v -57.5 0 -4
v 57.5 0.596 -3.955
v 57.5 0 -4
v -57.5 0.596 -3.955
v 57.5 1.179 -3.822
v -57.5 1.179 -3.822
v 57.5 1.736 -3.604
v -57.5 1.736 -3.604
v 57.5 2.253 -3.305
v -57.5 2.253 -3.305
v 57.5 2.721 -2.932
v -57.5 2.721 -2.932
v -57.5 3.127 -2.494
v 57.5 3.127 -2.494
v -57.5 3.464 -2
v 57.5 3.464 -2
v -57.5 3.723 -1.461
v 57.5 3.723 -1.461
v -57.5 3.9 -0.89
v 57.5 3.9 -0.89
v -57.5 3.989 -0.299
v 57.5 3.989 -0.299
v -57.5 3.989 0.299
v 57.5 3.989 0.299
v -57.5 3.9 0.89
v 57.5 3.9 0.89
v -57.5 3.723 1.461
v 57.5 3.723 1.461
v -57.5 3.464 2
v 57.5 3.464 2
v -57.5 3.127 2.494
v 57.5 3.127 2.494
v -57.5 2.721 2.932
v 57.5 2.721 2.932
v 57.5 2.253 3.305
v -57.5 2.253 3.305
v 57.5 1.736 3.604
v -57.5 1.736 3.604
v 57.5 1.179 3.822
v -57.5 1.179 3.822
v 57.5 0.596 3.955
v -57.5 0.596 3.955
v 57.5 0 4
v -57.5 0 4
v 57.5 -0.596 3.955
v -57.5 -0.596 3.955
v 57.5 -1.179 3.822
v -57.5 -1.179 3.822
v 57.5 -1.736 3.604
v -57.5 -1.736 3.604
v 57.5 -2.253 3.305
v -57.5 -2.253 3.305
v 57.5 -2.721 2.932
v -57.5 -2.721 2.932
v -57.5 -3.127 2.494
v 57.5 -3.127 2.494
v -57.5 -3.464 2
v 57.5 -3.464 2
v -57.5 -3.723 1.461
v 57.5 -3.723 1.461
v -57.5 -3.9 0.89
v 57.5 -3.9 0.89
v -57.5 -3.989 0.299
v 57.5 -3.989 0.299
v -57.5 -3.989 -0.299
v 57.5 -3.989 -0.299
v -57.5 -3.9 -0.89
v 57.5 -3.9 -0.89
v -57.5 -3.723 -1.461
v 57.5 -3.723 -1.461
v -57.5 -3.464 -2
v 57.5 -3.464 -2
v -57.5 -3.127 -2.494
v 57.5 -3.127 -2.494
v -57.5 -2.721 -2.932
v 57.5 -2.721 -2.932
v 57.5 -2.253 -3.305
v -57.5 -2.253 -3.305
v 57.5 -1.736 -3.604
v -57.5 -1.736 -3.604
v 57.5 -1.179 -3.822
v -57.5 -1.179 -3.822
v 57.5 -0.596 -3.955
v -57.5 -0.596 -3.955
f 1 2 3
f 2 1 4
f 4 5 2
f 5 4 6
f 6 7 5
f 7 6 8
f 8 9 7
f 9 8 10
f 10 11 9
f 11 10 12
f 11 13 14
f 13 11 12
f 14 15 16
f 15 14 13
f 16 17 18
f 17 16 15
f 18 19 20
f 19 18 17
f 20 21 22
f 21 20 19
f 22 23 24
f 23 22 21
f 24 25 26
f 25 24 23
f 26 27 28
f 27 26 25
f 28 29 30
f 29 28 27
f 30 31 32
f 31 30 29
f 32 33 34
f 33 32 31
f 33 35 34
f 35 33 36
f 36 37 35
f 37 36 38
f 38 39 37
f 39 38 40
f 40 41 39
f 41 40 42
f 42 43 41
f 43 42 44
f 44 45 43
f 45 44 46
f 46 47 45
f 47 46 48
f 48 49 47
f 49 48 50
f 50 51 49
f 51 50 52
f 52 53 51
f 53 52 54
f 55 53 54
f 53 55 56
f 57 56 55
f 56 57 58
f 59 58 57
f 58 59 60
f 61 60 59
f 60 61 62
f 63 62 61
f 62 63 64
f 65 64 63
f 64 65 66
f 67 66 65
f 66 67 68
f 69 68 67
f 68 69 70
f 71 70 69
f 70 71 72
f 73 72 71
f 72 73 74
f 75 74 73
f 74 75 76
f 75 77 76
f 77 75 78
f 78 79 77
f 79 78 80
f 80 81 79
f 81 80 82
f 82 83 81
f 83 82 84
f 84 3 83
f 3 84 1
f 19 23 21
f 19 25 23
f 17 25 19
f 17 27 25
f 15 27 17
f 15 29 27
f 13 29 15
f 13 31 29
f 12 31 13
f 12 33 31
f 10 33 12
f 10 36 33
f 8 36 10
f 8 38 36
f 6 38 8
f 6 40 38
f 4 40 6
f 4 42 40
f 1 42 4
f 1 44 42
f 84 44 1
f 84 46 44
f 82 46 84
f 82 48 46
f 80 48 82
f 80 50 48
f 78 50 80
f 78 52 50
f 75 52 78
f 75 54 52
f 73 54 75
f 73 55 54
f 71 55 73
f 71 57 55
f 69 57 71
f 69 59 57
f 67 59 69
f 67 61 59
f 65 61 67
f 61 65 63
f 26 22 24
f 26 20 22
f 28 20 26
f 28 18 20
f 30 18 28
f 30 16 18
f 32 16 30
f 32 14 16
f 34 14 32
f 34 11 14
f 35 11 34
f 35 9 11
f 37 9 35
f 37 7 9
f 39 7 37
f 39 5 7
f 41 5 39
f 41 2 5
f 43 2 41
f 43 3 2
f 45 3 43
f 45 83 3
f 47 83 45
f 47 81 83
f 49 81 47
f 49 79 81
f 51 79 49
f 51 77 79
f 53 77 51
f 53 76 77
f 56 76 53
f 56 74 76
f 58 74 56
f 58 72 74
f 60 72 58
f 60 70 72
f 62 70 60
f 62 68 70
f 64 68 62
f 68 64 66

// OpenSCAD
// file: params.scad
// ============================================================
//  Scanner 3D LiDAR — paramètres partagés
//  Toutes les cotes sont en millimètres.
//
//  Repère d'assemblage : z = 0 sur la face SUPÉRIEURE du plateau
//  de base. L'axe de rotation (lacet psi) est l'axe Z.
// ============================================================

// Finesse de facettisation adaptative : les petits perçages restent
// légers, les grands diamètres restent lisses.
$fa = 4;
$fs = 0.6;

// ------------------------------------------------------------
//  Ajustements d'impression
//  À recalibrer sur votre imprimante avec mechanical/openscad/
//  test_fits.scad avant d'imprimer les pièces définitives.
// ------------------------------------------------------------
fit_press = 0.15;   // serré   : roulement — encoche 5 du coupon (delta +0,15 → Ø22,15)
fit_slide = 0.45;   // glissant: tige — encoche 4 (delta +0,10 → Ø8,45)
fit_free = 0.50;    // libre   : dégagements

// ------------------------------------------------------------
//  Roulement 608ZZ
// ------------------------------------------------------------
bearing_od = 22;
bearing_id = 8;
bearing_w = 7;

// ------------------------------------------------------------
//  Arbre vertical (tige acier rectifiée Ø8 h6)
// ------------------------------------------------------------
shaft_d = 8;
// Longueur utile : de l'accouplement (z 65) au sommet du moyeu (z 180).
// Ne PAS dépasser 180 : au-delà, la tige pénètre dans le corps du LD19.
shaft_len = 115;

// ------------------------------------------------------------
//  Moteur NEMA 17 (17HS4401)
// ------------------------------------------------------------
nema_body = 42.3;
nema_len = 40;       // longueur du corps (marge : 38 mm réels)
nema_pitch = 31;     // entraxe carré des 4 vis M3
nema_boss_d = 22;    // bossage de centrage
nema_boss_h = 2;
nema_shaft_d = 5;
nema_shaft_l = 24;

// ------------------------------------------------------------
//  Accouplement flexible 5 mm -> 8 mm (type mâchoires / araignée)
// ------------------------------------------------------------
coupler_d = 19;
coupler_l = 25;

// ------------------------------------------------------------
//  LiDAR — STL-19P / FHL-LD19P (LDROBOT, 3 oreilles de fixation)
//  Câble vers le bas au montage sur le berceau.
//  ATTENTION : lidar_optical_offset à VÉRIFIER au pied à coulisse.
//  Voir docs/calibration.md § « Mesure du décalage optique ».
//  Perçage : datasheet STL-19P § 5.1 (cotes depuis le bord « back » = bas
//  au montage, câble en bas). Entraxe latéral 46,8 mm ; connecteur à 38,59 mm.
// ------------------------------------------------------------
lidar_w = 54;                  // envergure Y (oreilles comprises)
lidar_h = 46.29;               // hauteur Z sur la platine (face de fixation)
lidar_thk = 34.8;              // profondeur X (datasheet 34,80 mm)
lidar_optical_offset = 22;     // plan de balayage / face de fixation  <-- À VÉRIFIER
lidar_screw_d = 2.7;           // M2,5 traversant (3× Φ2,5)
lidar_hole_y = 23.4;           // demi-entraxe Y oreilles latérales (46,8 / 2)
lidar_side_hole_z = 31.92;     // Z oreilles lat. depuis le bas du footprint
lidar_top_hole_z = 42.69;      // Z oreille opposée au câble (46,29 − 3,6)
lidar_cable_z = 38.59;         // connecteur ZH1.5T (face câble) depuis le bas
lidar_cable_d = 14;            // passage nappe + connecteur (était 9 mm, trop juste)

// ------------------------------------------------------------
//  Visserie M3
// ------------------------------------------------------------
m3_clear = 3.4;
m3_head_d = 6.2;
m3_head_h = 3.2;
m3_nut_af = 5.6;   // entreplat
m3_nut_h = 2.7;

// ------------------------------------------------------------
//  Insert laiton 1/4"-20 UNC (fixation trépied)
// ------------------------------------------------------------
insert_qtr_d = 8.4;
insert_qtr_l = 13;

// ------------------------------------------------------------
//  Plateau de base
// ------------------------------------------------------------
plate_d = 126;
plate_t = 8;
tripod_boss_d = 30;
tripod_boss_h = 16;
tower_bolt_circle = 106;   // hors du cône : têtes de vis accessibles

// ------------------------------------------------------------
//  Colonne à roulements  (z local = 0 sur la face inférieure,
//  qui repose sur la face supérieure du plateau)
// ------------------------------------------------------------
tower_flange_d = 118;
tower_flange_t = 6;
tower_base_d = 96;
tower_top_d = 34;
tower_cone_top_z = 100;   // fin du cône
tower_total_h = 133;      // hauteur totale
tower_cavity_d = 62;      // dégagement moteur (diagonale NEMA 17 = 59.8 mm)
tower_cavity_top_z = 42;
tower_throat_d = 26;      // dégagement accouplement (Ø19)
tower_throat_z = 78;

bearing_lo_z = 82;        // face inférieure du roulement bas
bearing_hi_z = 122;       // face inférieure du roulement haut
bearing_relief_d = 23.5;

// ------------------------------------------------------------
//  Berceau LiDAR  (cotes en repère d'assemblage global)
// ------------------------------------------------------------
hub_d = 18;
hub_z0 = 140;
hub_z1 = 180;
hub_top_d = 12;          // rétreint pour limiter l'occultation au nadir
web_z0 = 176;
web_z1 = 188;
web_hw = 7;              // demi-largeur en Y
plate_x = -22;           // face de fixation du LiDAR (= -lidar_optical_offset)
cradle_plate_t = 5;
optical_z = 205;         // hauteur du centre optique  => centre du nuage

// ------------------------------------------------------------
//  Boîtier électronique
// ------------------------------------------------------------
box_ix = 106;
box_iy = 76;
box_iz = 34;
box_wall = 2.5;
// file: electronics_box.scad
// ============================================================
//  04 — Boîtier électronique  (ESP32-S3, TMC2209, buck, trigger PD)
//
//  Se sangle par colliers rilsan sur la colonne centrale du trépied
//  (berceaux en Ø32 sous le fond). L'électronique reste ainsi au sol :
//  la tête rotative demeure légère et le trépied équilibré.
//
//  Impression : ouverture vers le haut, sans support.
// ============================================================

include <lib.scad>

box_ox = box_ix + 2 * box_wall;
box_oy = box_iy + 2 * box_wall;
box_floor = 3;

// Colonnettes d'angle : volontairement fusionnées aux deux parois
// adjacentes, une colonnette isolée de Ø8 sur 34 mm casserait net.
post_x = box_ix / 2 - 4;
post_y = box_iy / 2 - 4;

module post(x, y) {
    translate([x, y, box_floor]) cylinder(d = 9, h = box_iz);
}

module electronics_box() {
    difference() {
        union() {
            // ---------- Coque ----------
            translate([-box_ox / 2, -box_oy / 2, 0])
                cube([box_ox, box_oy, box_iz + box_floor]);

            // ---------- Berceau de sanglage sur colonne de trépied ----------
            // Le boîtier reste au sol, sur la colonne centrale : la tête
            // rotative demeure légère et le trépied équilibré.
            for (x = [-34, 34])
                translate([x, 0, -6]) {
                    difference() {
                        translate([-7, -box_oy / 2, 0]) cube([14, box_oy, 6.01]);
                        translate([0, 0, -14]) rotate([90, 0, 0])
                            cylinder(d = 32, h = box_oy + 2, center = true);
                    }
                }
        }

        // ---------- Volume intérieur ----------
        translate([-box_ix / 2, -box_iy / 2, box_floor])
            cube([box_ix, box_iy, box_iz + 1]);

        // ---------- Presse-étoupe / passages de câbles ----------
        // câble LiDAR + moteur (côté colonne)
        for (y = [-22, 0, 22])
            translate([-box_ox / 2 - 1, y, box_floor + 14])
                rotate([0, 90, 0]) cylinder(d = 8, h = box_wall + 2);
        // entrée USB-C PD
        translate([box_ox / 2 - 1, 0, box_floor + 10])
            rotate([0, 90, 0]) cylinder(d = 12, h = box_wall + 2);
        // sortie USB-C de programmation ESP32
        translate([box_ox / 2 - 1, 30, box_floor + 10])
            rotate([0, 90, 0]) cylinder(d = 12, h = box_wall + 2);

        // ---------- Ventilation ----------
        for (x = [-3:3], y = [-1, 1])
            translate([x * 12, y * 26, -0.1]) cylinder(d = 5, h = box_floor + 0.2);

        // ---------- Passages rilsan (sanglage trépied) ----------
        for (x = [-34, 34], y = [-1, 1])
            translate([x, y * (box_oy / 2 - 1), box_floor + 6])
                rotate([90, 0, 0]) cube([5, 3, box_wall + 3], center = true);

    }

    // ---------- Colonnettes de couvercle ----------
    for (x = [-1, 1], y = [-1, 1])
        difference() {
            post(x * post_x, y * post_y);
            // avant-trou taraudé par la vis M3
            translate([x * post_x, y * post_y, box_iz + box_floor - 9])
                cylinder(d = 2.6, h = 10);
        }

    // ---------- Rails de montage des modules ----------
    // Grille de bossages M3 : fixation par vis autotaraudeuses ou rilsan.
    for (x = [-40, -14, 14, 40], y = [-20, 20])
        difference() {
            translate([x, y, box_floor]) cylinder(d = 7, h = 4);
            translate([x, y, box_floor + 0.5]) cylinder(d = 2.6, h = 5);
        }
}

electronics_box();
// file: lidar_cradle.scad
// ============================================================
//  03 — Berceau LiDAR
//  Serre sur la tige Ø8 et présente le STL-19P (LDROBOT) COUCHÉ SUR LA
//  TRANCHE, plan de balayage vertical contenant l'axe de rotation.
//  Fixation : 3 oreilles M2,5 (datasheet § 5.1), câble vers le bas.
//
//  Repère local : z = 0 à la base du moyeu (= z 140 en global).
//  Centre optique du LD19 en (0, 0, 65) local.
//
//  Contrainte de non-collision : tout ce qui se trouve en
//  x > plate_x doit rester sous z = 42.7 (dessous du LD19).
//
//  Impression : COUCHÉ, platine à plat sur le plateau
//  (rotate([0, -90, 0])). Supports sous le moyeu uniquement.
// ============================================================

include <lib.scad>

hub_h = hub_z1 - hub_z0;               // 40
optical_local_z = optical_z - hub_z0;  // 65
lidar_bottom = optical_local_z - lidar_h / 2;   // 45.7
clear_z = lidar_bottom - 3;                     // 42.7 : plafond du voile

web_lo = 24;
web_hi = 40;
plate_lo = 32;
plate_hi = 92;
plate_hw = 29;      // demi-largeur platine (58 mm > envergure 54 mm)
plate_back = plate_x - cradle_plate_t;   // -27

// Perçage M2,5 traversant la platine (axe X)
module lidar_mount_hole() {
    translate([plate_back - 0.1, 0, 0])
        rotate([0, 90, 0]) cylinder(d = lidar_screw_d, h = cradle_plate_t + 3);
}

module lidar_cradle() {
    difference() {
        union() {
            // ---------- Moyeu de serrage sur la tige ----------
            cylinder(d = hub_d, h = hub_h - 10);
            translate([0, 0, hub_h - 10])
                cylinder(d1 = hub_d, d2 = hub_top_d, h = 10);

            // ---------- Oreilles de serrage ----------
            translate([5, -9, 4]) cube([14, 18, 15]);

            // ---------- Secteur de butée (référence d'azimut) ----------
            rotate([0, 0, 180])
                difference() {
                    cylinder(d = 48, h = 10);
                    translate([0, 0, -1]) cylinder(d = hub_d - 0.01, h = 12);
                    rotate([0, 0, 13]) translate([-40, 0, -1]) cube([80, 80, 12]);
                    rotate([0, 0, -13]) translate([-40, -80, -1]) cube([80, 80, 12]);
                }

            // ---------- Voile de liaison moyeu <-> platine ----------
            hull() {
                translate([-2, -web_hw, web_lo]) cube([4, 2 * web_hw, web_hi - web_lo]);
                translate([plate_back, -web_hw, web_lo])
                    cube([4, 2 * web_hw, web_hi - web_lo]);
            }
            // nervure centrale du voile
            translate([plate_back, -3.5, web_lo - 6])
                cube([abs(plate_back), 7, clear_z - web_lo + 6]);

            // ---------- Platine de fixation du LiDAR ----------
            translate([plate_back, -plate_hw, plate_lo])
                cube([cradle_plate_t, 2 * plate_hw, plate_hi - plate_lo]);

            // ---------- Rebord de centrage STL-19P (côté +X) ----------
            difference() {
                translate([plate_x, -(lidar_w / 2 + 2.5), lidar_bottom - 2.5])
                    cube([2.5, lidar_w + 5, lidar_h + 5]);
                translate([plate_x - 0.1, -lidar_w / 2 - 0.25, lidar_bottom - 0.25])
                    cube([3, lidar_w + 0.5, lidar_h + 0.5]);
            }

            // ---------- Nervures dorsales (côté -X, hors volume LiDAR) ----------
            for (s = [-1, 1])
                translate([plate_back, s * (plate_hw - 5) - 2.5, plate_lo])
                    hull() {
                        cube([0.1, 5, plate_hi - plate_lo]);
                        translate([-13, 0, 0]) cube([0.1, 5, 26]);
                    }
        }

        // ---------- Alésage de la tige ----------
        translate([0, 0, -0.1]) cylinder(d = shaft_d + fit_slide, h = hub_h + 0.2);

        // ---------- Fente du collier ----------
        translate([3, -0.9, -0.1]) cube([22, 1.8, hub_h + 0.2]);

        // ---------- Vis de serrage M3 (axe Y) ----------
        translate([12, 12, 11.5]) rotate([90, 0, 0]) cylinder(d = m3_clear, h = 24);
        translate([12, -9.01, 11.5]) rotate([-90, 0, 0])
            cylinder(d = m3_nut_af / cos(30), h = 3.2, $fn = 6);

        // ---------- Fixation STL-19P : 3 oreilles M2,5 (câble vers le bas) ----------
        translate([0, -lidar_hole_y, lidar_bottom + lidar_side_hole_z])
            lidar_mount_hole();
        translate([0, lidar_hole_y, lidar_bottom + lidar_side_hole_z])
            lidar_mount_hole();
        translate([0, 0, lidar_bottom + lidar_top_hole_z])
            lidar_mount_hole();

        // ---------- Passage nappe / connecteur ZH1.5T (côté câble) ----------
        translate([plate_back - 0.1, 0, lidar_bottom + lidar_cable_z])
            rotate([0, 90, 0]) cylinder(d = lidar_cable_d, h = cradle_plate_t + 3);
        // dégagement dans le rebord de centrage
        translate([plate_x - 0.5, -lidar_cable_d / 2 - 1, lidar_bottom + lidar_cable_z - lidar_cable_d / 2])
            cube([4, lidar_cable_d + 2, lidar_cable_d + 2]);

        // ---------- Colliers rilsan de sécurité ----------
        for (z = [plate_lo + 8, plate_hi - 9])
            for (y = [-1, 1])
                translate([plate_back - 0.1, y * (plate_hw - 5), z])
                    rotate([0, 90, 0])
                        cube([5, 2.8, cradle_plate_t + 3], center = true);
    }
}

lidar_cradle();
// file: bearing_tower.scad
// ============================================================
//  02 — Colonne à roulements
//  Coiffe le moteur, porte les deux 608ZZ qui définissent l'axe
//  de rotation. C'est la pièce qui détermine la précision angulaire.
//
//  Impression : bride sur le plateau, telle quelle. Pas de support.
//  Réglages conseillés : 5 périmètres, 40 % remplissage.
// ============================================================

include <lib.scad>

module bearing_tower() {
    difference() {
        // ---------- Volume extérieur ----------
        union() {
            cylinder(d = tower_flange_d, h = tower_flange_t);
            translate([0, 0, tower_flange_t])
                cylinder(d1 = tower_base_d, d2 = tower_top_d,
                         h = tower_cone_top_z - tower_flange_t);
            translate([0, 0, tower_cone_top_z])
                cylinder(d = tower_top_d, h = tower_total_h - tower_cone_top_z);
        }

        // ---------- Cavité moteur ----------
        translate([0, 0, -0.1])
            cylinder(d = tower_cavity_d, h = tower_cavity_top_z + 0.1);
        // transition conique vers le col (dégagement accouplement)
        translate([0, 0, tower_cavity_top_z])
            cylinder(d1 = tower_cavity_d, d2 = tower_throat_d,
                     h = tower_throat_z - tower_cavity_top_z);
        // col
        translate([0, 0, tower_throat_z])
            cylinder(d = tower_throat_d, h = bearing_lo_z - tower_throat_z + 0.01);

        // ---------- Logements de roulements ----------
        // roulement bas (ajustement serré)
        translate([0, 0, bearing_lo_z])
            cylinder(d = bearing_od + fit_press, h = bearing_w);
        // dégagement entre roulements
        translate([0, 0, bearing_lo_z + bearing_w])
            cylinder(d = bearing_relief_d, h = bearing_hi_z - bearing_lo_z - bearing_w);
        // roulement haut (ajustement serré)
        translate([0, 0, bearing_hi_z])
            cylinder(d = bearing_od + fit_press, h = bearing_w);
        // dégagement au-dessus du roulement haut
        translate([0, 0, bearing_hi_z + bearing_w])
            cylinder(d = bearing_relief_d,
                     h = tower_total_h - bearing_hi_z - bearing_w + 0.1);

        // ---------- Fixation sur le plateau ----------
        for (i = [0:3])
            rotate([0, 0, 90 * i])
                translate([tower_bolt_circle / 2, 0, 0])
                    m3_counterbore(tower_flange_t, m3_head_h);

        // ---------- Accès aux vis de l'accouplement ----------
        // Indispensable : l'accouplement se trouve à z 52..77, à
        // l'intérieur de la colonne, une fois celle-ci en place.
        for (i = [0:2])
            rotate([0, 0, 120 * i])
                translate([0, 0, 64]) hex_window(across = 19, depth = 200);

        // ---------- Sortie du câble moteur ----------
        rotate([0, 0, 180])
            translate([0, 0, 22]) hex_window(across = 22, depth = 200);

        // ---------- Encoche de bride : passage des câbles sous la colonne ----------
        rotate([0, 0, 180])
            translate([tower_cavity_d / 2 - 2, -4.5, -0.1])
                cube([30, 9, tower_flange_t + 0.2]);

        // ---------- Aération de la cavité moteur ----------
        for (i = [0:2])
            rotate([0, 0, 60 + 120 * i])
                translate([0, 0, 24]) hex_window(across = 13, depth = 200);

        // ---------- Repère d'azimut zéro ----------
        translate([tower_flange_d / 2 - 7, -1.2, tower_flange_t - 1])
            cube([9, 2.4, 1.2]);
    }

    // ---------- Butée mécanique de référence (homing StallGuard) ----------
    // Contrefort fixe contre lequel vient buter le secteur du berceau.
    // Définit le zéro d'azimut absolu, sans capteur.
    rotate([0, 0, 180])
        difference() {
            union() {
                // contrefort triangulaire adossé au col
                hull() {
                    translate([8, -4.5, 74]) cube([10, 9, 10]);
                    translate([13, -4.5, 100]) cube([11, 9, 52]);
                }
                // raccord au cône
                hull() {
                    translate([8, -4.5, 74]) cube([10, 9, 10]);
                    translate([20, -4.5, 74]) cube([8, 9, 6]);
                }
            }
            // ne pas empiéter sur l'alésage des roulements
            cylinder(d = tower_top_d - 0.01, h = 200);
        }
}

bearing_tower();
// file: base_plate.scad
// ============================================================
//  01 — Plateau de base
//  Interface trépied 1/4"-20 + support moteur NEMA 17 + embase colonne
//
//  Impression : POSÉ À L'ENVERS (face supérieure sur le plateau),
//  le bossage trépied vers le haut. Aucun support nécessaire.
// ============================================================

include <lib.scad>

module base_plate() {
    difference() {
        union() {
            cylinder(d = plate_d, h = plate_t);
            translate([0, 0, -tripod_boss_h])
                cylinder(d = tripod_boss_d, h = tripod_boss_h);
            // congé de raccordement bossage / plateau
            translate([0, 0, 0]) mirror([0, 0, 1]) fillet_ring(tripod_boss_d / 2, 4);
        }

        // --- Insert laiton 1/4"-20, posé par le dessous ---
        translate([0, 0, -tripod_boss_h - 0.1])
            cylinder(d = insert_qtr_d, h = insert_qtr_l + 0.1);
        // chanfrein d'amorce
        translate([0, 0, -tripod_boss_h - 0.1])
            cylinder(d1 = insert_qtr_d + 1.6, d2 = insert_qtr_d, h = 1.7);

        // --- Dégagement du bossage de centrage moteur ---
        translate([0, 0, plate_t - nema_boss_h - 0.4])
            cylinder(d = nema_boss_d + 1.2, h = nema_boss_h + 1);

        // --- Fixation moteur : 4 x M3 carré 31 mm ---
        // Les vis montent PAR LE DESSOUS et se vissent dans les trous
        // taraudés du NEMA 17. Têtes noyées pour ne pas gêner la
        // semelle du trépied.
        for (x = [-1, 1], y = [-1, 1])
            translate([x * nema_pitch / 2, y * nema_pitch / 2, -0.1]) {
                cylinder(d = m3_clear, h = plate_t + 0.2);
                cylinder(d = m3_head_d + 0.4, h = m3_head_h + 0.6);
            }

        // --- Fixation de la colonne : 4 x M3 ---
        for (i = [0:3])
            rotate([0, 0, 90 * i])
                translate([tower_bolt_circle / 2, 0, -0.1]) {
                    cylinder(d = m3_clear, h = plate_t + 0.2);
                    nut_pocket(h = m3_nut_h + 0.3);
                }

        // --- Passage des câbles (moteur + LiDAR) vers le boîtier ---
        rotate([0, 0, 180])
            translate([36, 0, 0]) cable_slot(len = 18, width = 8, h = plate_t);

        // --- Repère d'azimut zéro gravé sur le pourtour ---
        translate([plate_d / 2 - 6, -1.2, plate_t - 1])
            cube([8, 2.4, 1.2]);
    }
}

base_plate();
// file: lib.scad
// ============================================================
//  Primitives réutilisables
// ============================================================

include <params.scad>

// Empreinte hexagonale pour écrou (entreplat = af)
module nut_pocket(af = m3_nut_af, h = m3_nut_h, slot = 0) {
    d = af / cos(30);
    union() {
        cylinder(d = d, h = h, $fn = 6);
        // couloir d'insertion latéral
        if (slot > 0)
            translate([0, -af / 2, 0]) cube([slot, af, h]);
    }
}

// Trou de passage M3 avec lamage pour tête cylindrique
module m3_counterbore(depth, head_depth = m3_head_h) {
    translate([0, 0, -0.1]) cylinder(d = m3_clear, h = depth + 0.2);
    translate([0, 0, depth - head_depth]) cylinder(d = m3_head_d, h = head_depth + 0.1);
}

// Lumière oblongue (slot) orientée selon X, traversant en Z
module slot(d, len, h) {
    hull() {
        translate([-len / 2, 0, 0]) cylinder(d = d, h = h);
        translate([len / 2, 0, 0]) cylinder(d = d, h = h);
    }
}

// Fenêtre hexagonale auto-portante (sommet vers le haut),
// axe horizontal selon X, à percer dans une paroi.
module hex_window(across, depth) {
    rotate([0, 90, 0]) rotate([0, 0, 90])
        cylinder(d = across / cos(30), h = depth, $fn = 6, center = true);
}

// Congé de raccordement (quart de tore) à la base d'un cylindre
module fillet_ring(r_outer, r_fillet) {
    rotate_extrude()
        translate([r_outer, 0, 0])
            difference() {
                square([r_fillet, r_fillet]);
                translate([r_fillet, r_fillet]) circle(r = r_fillet);
            }
}

// Passe-câble : fente arrondie traversante
module cable_slot(len, width, h) {
    hull() {
        translate([-len / 2, 0, -0.1]) cylinder(d = width, h = h + 0.2);
        translate([len / 2, 0, -0.1]) cylinder(d = width, h = h + 0.2);
    }
}

// Trous pour collier de serrage (rilsan) : deux fentes parallèles
module zip_tie_pair(spacing = 10, w = 4, t = 2.2, h = 10) {
    for (s = [-1, 1])
        translate([s * spacing / 2, 0, -0.1])
            cube([t, w, h + 0.2], center = false);
}
// main file
// ============================================================
//  Vues d'assemblage par étape (docs/assembly.md)
//
//  Usage :
//    openscad -D step=3 -o /tmp/step.stl assembly_steps.scad
//
//  step = 1 … 11  →  montage mécanique / câblage
// ============================================================

include <lib.scad>

use <base_plate.scad>
use <bearing_tower.scad>
use <lidar_cradle.scad>
use <electronics_box.scad>

step = 1;   // surchargé en ligne de commande : -D step=N

module ghost_nema17() {
    color("#404448") {
        translate([-nema_body / 2, -nema_body / 2, 0]) cube([nema_body, nema_body, nema_len]);
        translate([0, 0, nema_len]) cylinder(d = nema_boss_d, h = nema_boss_h);
        translate([0, 0, nema_len + nema_boss_h]) cylinder(d = nema_shaft_d, h = nema_shaft_l);
    }
}

module ghost_bearing() {
    color("#9aa0a6")
        difference() {
            cylinder(d = bearing_od, h = bearing_w);
            translate([0, 0, -0.5]) cylinder(d = bearing_id, h = bearing_w + 1);
        }
}

module ghost_coupler() {
    color("#c0392b") cylinder(d = coupler_d, h = coupler_l);
}

module ghost_shaft() {
    color("#d8dce0") cylinder(d = shaft_d, h = shaft_len);
}

// Ghost des trous de fixation (validation cotes datasheet § 5.1)
module ghost_lidar_holes() {
    color("#e74c3c", 0.35)
        for (y = [-1, 1])
            translate([plate_x, y * lidar_hole_y, optical_z - lidar_h / 2 + lidar_side_hole_z])
                rotate([0, 90, 0]) cylinder(d = lidar_screw_d, h = 8, center = true);
    color("#e74c3c", 0.35)
        translate([plate_x, 0, optical_z - lidar_h / 2 + lidar_top_hole_z])
            rotate([0, 90, 0]) cylinder(d = lidar_screw_d, h = 8, center = true);
    color("#f39c12", 0.25)
        translate([plate_x, 0, optical_z - lidar_h / 2 + lidar_cable_z])
            rotate([0, 90, 0]) cylinder(d = lidar_cable_d, h = 8, center = true);
}

module ghost_lidar() {
    color("#2b2f33")
        translate([plate_x, -lidar_w / 2, optical_z - lidar_h / 2])
            cube([lidar_thk, lidar_w, lidar_h]);
    color("#1a1d20")
        translate([-1.5, 0, optical_z]) rotate([0, 90, 0]) cylinder(d = 30, h = 3);
}

// Câble LiDAR simplifié (hélice le long de la colonne)
module ghost_lidar_cable() {
    color("#f39c12")
        for (i = [0:24])
            translate([14 * cos(i * 30), 14 * sin(i * 30), 40 + i * 5.5])
                rotate([0, 90, i * 30]) cylinder(d = 4, h = 6, center = true);
}

// Étape 1 — tige recoupée 115 mm
module step01() {
    rotate([0, 90, 0]) translate([0, 0, -shaft_len / 2]) ghost_shaft();
}

// Étape 2 — insert trépied (plateau à l'envers, bossage visible)
module step02() {
    rotate([180, 0, 0])
        translate([0, 0, -plate_t])
            color("#4a90d9") base_plate();
}

// Étape 3 — moteur vissé sous le plateau
module step03() {
    rotate([180, 0, 0]) {
        translate([0, 0, -plate_t]) color("#4a90d9") base_plate();
        translate([0, 0, -plate_t - nema_len]) ghost_nema17();
    }
}

// Étape 4 — roulements dans la colonne (seule)
module step04() {
    color("#5aa469") bearing_tower();
    translate([0, 0, bearing_lo_z]) ghost_bearing();
    translate([0, 0, bearing_hi_z]) ghost_bearing();
}

// Étape 5 — accouplement sur l'arbre moteur (plateau + moteur + coupleur)
module step05() {
    translate([0, 0, -plate_t]) color("#4a90d9") base_plate();
    ghost_nema17();
    translate([0, 0, 52]) ghost_coupler();
}

// Étape 6 — colonne fixée sur le plateau
module step06() {
    translate([0, 0, -plate_t]) color("#4a90d9") base_plate();
    color("#5aa469") bearing_tower();
    ghost_nema17();
}

// Étape 7 — tige + serrage accouplement
module step07() {
    translate([0, 0, -plate_t]) color("#4a90d9") base_plate();
    color("#5aa469") bearing_tower();
    ghost_nema17();
    translate([0, 0, 52]) ghost_coupler();
    translate([0, 0, 65]) ghost_shaft();
    translate([0, 0, bearing_lo_z]) ghost_bearing();
    translate([0, 0, bearing_hi_z]) ghost_bearing();
}

// Étape 8 — LD19 sur le berceau
module step08() {
    translate([0, 0, hub_z0]) {
        color("#e8a33d") lidar_cradle();
        ghost_lidar();
        ghost_lidar_holes();
    }
}

// Étape 9 — berceau sur la tige (tête tournante)
module step09() {
    translate([0, 0, -plate_t]) color("#4a90d9") base_plate();
    color("#5aa469") bearing_tower();
    translate([0, 0, 65]) ghost_shaft();
    translate([0, 0, bearing_lo_z]) ghost_bearing();
    translate([0, 0, bearing_hi_z]) ghost_bearing();
    translate([0, 0, hub_z0]) {
        color("#e8a33d") lidar_cradle();
        ghost_lidar();
    }
}

// Étape 10 — boîtier électronique
module step10() {
    color("#9b6bc4") electronics_box();
}

// Étape 11 — câble LiDAR + assemblage complet
module step11() {
    translate([0, 0, -plate_t]) color("#4a90d9") base_plate();
    color("#5aa469") bearing_tower();
    translate([0, 0, 65]) ghost_shaft();
    translate([0, 0, bearing_lo_z]) ghost_bearing();
    translate([0, 0, bearing_hi_z]) ghost_bearing();
    translate([0, 0, hub_z0]) {
        color("#e8a33d") lidar_cradle();
        ghost_lidar();
    }
    ghost_lidar_cable();
    translate([0, 0, -plate_t - box_iz / 2 - 8])
        rotate([0, 0, 45])
            color("#9b6bc4") electronics_box();
}

module dispatch() {
    if (step == 1) step01();
    else if (step == 2) step02();
    else if (step == 3) step03();
    else if (step == 4) step04();
    else if (step == 5) step05();
    else if (step == 6) step06();
    else if (step == 7) step07();
    else if (step == 8) step08();
    else if (step == 9) step09();
    else if (step == 10) step10();
    else if (step == 11) step11();
    else union();  // step inconnu → STL vide (erreur visible)
}

dispatch();
